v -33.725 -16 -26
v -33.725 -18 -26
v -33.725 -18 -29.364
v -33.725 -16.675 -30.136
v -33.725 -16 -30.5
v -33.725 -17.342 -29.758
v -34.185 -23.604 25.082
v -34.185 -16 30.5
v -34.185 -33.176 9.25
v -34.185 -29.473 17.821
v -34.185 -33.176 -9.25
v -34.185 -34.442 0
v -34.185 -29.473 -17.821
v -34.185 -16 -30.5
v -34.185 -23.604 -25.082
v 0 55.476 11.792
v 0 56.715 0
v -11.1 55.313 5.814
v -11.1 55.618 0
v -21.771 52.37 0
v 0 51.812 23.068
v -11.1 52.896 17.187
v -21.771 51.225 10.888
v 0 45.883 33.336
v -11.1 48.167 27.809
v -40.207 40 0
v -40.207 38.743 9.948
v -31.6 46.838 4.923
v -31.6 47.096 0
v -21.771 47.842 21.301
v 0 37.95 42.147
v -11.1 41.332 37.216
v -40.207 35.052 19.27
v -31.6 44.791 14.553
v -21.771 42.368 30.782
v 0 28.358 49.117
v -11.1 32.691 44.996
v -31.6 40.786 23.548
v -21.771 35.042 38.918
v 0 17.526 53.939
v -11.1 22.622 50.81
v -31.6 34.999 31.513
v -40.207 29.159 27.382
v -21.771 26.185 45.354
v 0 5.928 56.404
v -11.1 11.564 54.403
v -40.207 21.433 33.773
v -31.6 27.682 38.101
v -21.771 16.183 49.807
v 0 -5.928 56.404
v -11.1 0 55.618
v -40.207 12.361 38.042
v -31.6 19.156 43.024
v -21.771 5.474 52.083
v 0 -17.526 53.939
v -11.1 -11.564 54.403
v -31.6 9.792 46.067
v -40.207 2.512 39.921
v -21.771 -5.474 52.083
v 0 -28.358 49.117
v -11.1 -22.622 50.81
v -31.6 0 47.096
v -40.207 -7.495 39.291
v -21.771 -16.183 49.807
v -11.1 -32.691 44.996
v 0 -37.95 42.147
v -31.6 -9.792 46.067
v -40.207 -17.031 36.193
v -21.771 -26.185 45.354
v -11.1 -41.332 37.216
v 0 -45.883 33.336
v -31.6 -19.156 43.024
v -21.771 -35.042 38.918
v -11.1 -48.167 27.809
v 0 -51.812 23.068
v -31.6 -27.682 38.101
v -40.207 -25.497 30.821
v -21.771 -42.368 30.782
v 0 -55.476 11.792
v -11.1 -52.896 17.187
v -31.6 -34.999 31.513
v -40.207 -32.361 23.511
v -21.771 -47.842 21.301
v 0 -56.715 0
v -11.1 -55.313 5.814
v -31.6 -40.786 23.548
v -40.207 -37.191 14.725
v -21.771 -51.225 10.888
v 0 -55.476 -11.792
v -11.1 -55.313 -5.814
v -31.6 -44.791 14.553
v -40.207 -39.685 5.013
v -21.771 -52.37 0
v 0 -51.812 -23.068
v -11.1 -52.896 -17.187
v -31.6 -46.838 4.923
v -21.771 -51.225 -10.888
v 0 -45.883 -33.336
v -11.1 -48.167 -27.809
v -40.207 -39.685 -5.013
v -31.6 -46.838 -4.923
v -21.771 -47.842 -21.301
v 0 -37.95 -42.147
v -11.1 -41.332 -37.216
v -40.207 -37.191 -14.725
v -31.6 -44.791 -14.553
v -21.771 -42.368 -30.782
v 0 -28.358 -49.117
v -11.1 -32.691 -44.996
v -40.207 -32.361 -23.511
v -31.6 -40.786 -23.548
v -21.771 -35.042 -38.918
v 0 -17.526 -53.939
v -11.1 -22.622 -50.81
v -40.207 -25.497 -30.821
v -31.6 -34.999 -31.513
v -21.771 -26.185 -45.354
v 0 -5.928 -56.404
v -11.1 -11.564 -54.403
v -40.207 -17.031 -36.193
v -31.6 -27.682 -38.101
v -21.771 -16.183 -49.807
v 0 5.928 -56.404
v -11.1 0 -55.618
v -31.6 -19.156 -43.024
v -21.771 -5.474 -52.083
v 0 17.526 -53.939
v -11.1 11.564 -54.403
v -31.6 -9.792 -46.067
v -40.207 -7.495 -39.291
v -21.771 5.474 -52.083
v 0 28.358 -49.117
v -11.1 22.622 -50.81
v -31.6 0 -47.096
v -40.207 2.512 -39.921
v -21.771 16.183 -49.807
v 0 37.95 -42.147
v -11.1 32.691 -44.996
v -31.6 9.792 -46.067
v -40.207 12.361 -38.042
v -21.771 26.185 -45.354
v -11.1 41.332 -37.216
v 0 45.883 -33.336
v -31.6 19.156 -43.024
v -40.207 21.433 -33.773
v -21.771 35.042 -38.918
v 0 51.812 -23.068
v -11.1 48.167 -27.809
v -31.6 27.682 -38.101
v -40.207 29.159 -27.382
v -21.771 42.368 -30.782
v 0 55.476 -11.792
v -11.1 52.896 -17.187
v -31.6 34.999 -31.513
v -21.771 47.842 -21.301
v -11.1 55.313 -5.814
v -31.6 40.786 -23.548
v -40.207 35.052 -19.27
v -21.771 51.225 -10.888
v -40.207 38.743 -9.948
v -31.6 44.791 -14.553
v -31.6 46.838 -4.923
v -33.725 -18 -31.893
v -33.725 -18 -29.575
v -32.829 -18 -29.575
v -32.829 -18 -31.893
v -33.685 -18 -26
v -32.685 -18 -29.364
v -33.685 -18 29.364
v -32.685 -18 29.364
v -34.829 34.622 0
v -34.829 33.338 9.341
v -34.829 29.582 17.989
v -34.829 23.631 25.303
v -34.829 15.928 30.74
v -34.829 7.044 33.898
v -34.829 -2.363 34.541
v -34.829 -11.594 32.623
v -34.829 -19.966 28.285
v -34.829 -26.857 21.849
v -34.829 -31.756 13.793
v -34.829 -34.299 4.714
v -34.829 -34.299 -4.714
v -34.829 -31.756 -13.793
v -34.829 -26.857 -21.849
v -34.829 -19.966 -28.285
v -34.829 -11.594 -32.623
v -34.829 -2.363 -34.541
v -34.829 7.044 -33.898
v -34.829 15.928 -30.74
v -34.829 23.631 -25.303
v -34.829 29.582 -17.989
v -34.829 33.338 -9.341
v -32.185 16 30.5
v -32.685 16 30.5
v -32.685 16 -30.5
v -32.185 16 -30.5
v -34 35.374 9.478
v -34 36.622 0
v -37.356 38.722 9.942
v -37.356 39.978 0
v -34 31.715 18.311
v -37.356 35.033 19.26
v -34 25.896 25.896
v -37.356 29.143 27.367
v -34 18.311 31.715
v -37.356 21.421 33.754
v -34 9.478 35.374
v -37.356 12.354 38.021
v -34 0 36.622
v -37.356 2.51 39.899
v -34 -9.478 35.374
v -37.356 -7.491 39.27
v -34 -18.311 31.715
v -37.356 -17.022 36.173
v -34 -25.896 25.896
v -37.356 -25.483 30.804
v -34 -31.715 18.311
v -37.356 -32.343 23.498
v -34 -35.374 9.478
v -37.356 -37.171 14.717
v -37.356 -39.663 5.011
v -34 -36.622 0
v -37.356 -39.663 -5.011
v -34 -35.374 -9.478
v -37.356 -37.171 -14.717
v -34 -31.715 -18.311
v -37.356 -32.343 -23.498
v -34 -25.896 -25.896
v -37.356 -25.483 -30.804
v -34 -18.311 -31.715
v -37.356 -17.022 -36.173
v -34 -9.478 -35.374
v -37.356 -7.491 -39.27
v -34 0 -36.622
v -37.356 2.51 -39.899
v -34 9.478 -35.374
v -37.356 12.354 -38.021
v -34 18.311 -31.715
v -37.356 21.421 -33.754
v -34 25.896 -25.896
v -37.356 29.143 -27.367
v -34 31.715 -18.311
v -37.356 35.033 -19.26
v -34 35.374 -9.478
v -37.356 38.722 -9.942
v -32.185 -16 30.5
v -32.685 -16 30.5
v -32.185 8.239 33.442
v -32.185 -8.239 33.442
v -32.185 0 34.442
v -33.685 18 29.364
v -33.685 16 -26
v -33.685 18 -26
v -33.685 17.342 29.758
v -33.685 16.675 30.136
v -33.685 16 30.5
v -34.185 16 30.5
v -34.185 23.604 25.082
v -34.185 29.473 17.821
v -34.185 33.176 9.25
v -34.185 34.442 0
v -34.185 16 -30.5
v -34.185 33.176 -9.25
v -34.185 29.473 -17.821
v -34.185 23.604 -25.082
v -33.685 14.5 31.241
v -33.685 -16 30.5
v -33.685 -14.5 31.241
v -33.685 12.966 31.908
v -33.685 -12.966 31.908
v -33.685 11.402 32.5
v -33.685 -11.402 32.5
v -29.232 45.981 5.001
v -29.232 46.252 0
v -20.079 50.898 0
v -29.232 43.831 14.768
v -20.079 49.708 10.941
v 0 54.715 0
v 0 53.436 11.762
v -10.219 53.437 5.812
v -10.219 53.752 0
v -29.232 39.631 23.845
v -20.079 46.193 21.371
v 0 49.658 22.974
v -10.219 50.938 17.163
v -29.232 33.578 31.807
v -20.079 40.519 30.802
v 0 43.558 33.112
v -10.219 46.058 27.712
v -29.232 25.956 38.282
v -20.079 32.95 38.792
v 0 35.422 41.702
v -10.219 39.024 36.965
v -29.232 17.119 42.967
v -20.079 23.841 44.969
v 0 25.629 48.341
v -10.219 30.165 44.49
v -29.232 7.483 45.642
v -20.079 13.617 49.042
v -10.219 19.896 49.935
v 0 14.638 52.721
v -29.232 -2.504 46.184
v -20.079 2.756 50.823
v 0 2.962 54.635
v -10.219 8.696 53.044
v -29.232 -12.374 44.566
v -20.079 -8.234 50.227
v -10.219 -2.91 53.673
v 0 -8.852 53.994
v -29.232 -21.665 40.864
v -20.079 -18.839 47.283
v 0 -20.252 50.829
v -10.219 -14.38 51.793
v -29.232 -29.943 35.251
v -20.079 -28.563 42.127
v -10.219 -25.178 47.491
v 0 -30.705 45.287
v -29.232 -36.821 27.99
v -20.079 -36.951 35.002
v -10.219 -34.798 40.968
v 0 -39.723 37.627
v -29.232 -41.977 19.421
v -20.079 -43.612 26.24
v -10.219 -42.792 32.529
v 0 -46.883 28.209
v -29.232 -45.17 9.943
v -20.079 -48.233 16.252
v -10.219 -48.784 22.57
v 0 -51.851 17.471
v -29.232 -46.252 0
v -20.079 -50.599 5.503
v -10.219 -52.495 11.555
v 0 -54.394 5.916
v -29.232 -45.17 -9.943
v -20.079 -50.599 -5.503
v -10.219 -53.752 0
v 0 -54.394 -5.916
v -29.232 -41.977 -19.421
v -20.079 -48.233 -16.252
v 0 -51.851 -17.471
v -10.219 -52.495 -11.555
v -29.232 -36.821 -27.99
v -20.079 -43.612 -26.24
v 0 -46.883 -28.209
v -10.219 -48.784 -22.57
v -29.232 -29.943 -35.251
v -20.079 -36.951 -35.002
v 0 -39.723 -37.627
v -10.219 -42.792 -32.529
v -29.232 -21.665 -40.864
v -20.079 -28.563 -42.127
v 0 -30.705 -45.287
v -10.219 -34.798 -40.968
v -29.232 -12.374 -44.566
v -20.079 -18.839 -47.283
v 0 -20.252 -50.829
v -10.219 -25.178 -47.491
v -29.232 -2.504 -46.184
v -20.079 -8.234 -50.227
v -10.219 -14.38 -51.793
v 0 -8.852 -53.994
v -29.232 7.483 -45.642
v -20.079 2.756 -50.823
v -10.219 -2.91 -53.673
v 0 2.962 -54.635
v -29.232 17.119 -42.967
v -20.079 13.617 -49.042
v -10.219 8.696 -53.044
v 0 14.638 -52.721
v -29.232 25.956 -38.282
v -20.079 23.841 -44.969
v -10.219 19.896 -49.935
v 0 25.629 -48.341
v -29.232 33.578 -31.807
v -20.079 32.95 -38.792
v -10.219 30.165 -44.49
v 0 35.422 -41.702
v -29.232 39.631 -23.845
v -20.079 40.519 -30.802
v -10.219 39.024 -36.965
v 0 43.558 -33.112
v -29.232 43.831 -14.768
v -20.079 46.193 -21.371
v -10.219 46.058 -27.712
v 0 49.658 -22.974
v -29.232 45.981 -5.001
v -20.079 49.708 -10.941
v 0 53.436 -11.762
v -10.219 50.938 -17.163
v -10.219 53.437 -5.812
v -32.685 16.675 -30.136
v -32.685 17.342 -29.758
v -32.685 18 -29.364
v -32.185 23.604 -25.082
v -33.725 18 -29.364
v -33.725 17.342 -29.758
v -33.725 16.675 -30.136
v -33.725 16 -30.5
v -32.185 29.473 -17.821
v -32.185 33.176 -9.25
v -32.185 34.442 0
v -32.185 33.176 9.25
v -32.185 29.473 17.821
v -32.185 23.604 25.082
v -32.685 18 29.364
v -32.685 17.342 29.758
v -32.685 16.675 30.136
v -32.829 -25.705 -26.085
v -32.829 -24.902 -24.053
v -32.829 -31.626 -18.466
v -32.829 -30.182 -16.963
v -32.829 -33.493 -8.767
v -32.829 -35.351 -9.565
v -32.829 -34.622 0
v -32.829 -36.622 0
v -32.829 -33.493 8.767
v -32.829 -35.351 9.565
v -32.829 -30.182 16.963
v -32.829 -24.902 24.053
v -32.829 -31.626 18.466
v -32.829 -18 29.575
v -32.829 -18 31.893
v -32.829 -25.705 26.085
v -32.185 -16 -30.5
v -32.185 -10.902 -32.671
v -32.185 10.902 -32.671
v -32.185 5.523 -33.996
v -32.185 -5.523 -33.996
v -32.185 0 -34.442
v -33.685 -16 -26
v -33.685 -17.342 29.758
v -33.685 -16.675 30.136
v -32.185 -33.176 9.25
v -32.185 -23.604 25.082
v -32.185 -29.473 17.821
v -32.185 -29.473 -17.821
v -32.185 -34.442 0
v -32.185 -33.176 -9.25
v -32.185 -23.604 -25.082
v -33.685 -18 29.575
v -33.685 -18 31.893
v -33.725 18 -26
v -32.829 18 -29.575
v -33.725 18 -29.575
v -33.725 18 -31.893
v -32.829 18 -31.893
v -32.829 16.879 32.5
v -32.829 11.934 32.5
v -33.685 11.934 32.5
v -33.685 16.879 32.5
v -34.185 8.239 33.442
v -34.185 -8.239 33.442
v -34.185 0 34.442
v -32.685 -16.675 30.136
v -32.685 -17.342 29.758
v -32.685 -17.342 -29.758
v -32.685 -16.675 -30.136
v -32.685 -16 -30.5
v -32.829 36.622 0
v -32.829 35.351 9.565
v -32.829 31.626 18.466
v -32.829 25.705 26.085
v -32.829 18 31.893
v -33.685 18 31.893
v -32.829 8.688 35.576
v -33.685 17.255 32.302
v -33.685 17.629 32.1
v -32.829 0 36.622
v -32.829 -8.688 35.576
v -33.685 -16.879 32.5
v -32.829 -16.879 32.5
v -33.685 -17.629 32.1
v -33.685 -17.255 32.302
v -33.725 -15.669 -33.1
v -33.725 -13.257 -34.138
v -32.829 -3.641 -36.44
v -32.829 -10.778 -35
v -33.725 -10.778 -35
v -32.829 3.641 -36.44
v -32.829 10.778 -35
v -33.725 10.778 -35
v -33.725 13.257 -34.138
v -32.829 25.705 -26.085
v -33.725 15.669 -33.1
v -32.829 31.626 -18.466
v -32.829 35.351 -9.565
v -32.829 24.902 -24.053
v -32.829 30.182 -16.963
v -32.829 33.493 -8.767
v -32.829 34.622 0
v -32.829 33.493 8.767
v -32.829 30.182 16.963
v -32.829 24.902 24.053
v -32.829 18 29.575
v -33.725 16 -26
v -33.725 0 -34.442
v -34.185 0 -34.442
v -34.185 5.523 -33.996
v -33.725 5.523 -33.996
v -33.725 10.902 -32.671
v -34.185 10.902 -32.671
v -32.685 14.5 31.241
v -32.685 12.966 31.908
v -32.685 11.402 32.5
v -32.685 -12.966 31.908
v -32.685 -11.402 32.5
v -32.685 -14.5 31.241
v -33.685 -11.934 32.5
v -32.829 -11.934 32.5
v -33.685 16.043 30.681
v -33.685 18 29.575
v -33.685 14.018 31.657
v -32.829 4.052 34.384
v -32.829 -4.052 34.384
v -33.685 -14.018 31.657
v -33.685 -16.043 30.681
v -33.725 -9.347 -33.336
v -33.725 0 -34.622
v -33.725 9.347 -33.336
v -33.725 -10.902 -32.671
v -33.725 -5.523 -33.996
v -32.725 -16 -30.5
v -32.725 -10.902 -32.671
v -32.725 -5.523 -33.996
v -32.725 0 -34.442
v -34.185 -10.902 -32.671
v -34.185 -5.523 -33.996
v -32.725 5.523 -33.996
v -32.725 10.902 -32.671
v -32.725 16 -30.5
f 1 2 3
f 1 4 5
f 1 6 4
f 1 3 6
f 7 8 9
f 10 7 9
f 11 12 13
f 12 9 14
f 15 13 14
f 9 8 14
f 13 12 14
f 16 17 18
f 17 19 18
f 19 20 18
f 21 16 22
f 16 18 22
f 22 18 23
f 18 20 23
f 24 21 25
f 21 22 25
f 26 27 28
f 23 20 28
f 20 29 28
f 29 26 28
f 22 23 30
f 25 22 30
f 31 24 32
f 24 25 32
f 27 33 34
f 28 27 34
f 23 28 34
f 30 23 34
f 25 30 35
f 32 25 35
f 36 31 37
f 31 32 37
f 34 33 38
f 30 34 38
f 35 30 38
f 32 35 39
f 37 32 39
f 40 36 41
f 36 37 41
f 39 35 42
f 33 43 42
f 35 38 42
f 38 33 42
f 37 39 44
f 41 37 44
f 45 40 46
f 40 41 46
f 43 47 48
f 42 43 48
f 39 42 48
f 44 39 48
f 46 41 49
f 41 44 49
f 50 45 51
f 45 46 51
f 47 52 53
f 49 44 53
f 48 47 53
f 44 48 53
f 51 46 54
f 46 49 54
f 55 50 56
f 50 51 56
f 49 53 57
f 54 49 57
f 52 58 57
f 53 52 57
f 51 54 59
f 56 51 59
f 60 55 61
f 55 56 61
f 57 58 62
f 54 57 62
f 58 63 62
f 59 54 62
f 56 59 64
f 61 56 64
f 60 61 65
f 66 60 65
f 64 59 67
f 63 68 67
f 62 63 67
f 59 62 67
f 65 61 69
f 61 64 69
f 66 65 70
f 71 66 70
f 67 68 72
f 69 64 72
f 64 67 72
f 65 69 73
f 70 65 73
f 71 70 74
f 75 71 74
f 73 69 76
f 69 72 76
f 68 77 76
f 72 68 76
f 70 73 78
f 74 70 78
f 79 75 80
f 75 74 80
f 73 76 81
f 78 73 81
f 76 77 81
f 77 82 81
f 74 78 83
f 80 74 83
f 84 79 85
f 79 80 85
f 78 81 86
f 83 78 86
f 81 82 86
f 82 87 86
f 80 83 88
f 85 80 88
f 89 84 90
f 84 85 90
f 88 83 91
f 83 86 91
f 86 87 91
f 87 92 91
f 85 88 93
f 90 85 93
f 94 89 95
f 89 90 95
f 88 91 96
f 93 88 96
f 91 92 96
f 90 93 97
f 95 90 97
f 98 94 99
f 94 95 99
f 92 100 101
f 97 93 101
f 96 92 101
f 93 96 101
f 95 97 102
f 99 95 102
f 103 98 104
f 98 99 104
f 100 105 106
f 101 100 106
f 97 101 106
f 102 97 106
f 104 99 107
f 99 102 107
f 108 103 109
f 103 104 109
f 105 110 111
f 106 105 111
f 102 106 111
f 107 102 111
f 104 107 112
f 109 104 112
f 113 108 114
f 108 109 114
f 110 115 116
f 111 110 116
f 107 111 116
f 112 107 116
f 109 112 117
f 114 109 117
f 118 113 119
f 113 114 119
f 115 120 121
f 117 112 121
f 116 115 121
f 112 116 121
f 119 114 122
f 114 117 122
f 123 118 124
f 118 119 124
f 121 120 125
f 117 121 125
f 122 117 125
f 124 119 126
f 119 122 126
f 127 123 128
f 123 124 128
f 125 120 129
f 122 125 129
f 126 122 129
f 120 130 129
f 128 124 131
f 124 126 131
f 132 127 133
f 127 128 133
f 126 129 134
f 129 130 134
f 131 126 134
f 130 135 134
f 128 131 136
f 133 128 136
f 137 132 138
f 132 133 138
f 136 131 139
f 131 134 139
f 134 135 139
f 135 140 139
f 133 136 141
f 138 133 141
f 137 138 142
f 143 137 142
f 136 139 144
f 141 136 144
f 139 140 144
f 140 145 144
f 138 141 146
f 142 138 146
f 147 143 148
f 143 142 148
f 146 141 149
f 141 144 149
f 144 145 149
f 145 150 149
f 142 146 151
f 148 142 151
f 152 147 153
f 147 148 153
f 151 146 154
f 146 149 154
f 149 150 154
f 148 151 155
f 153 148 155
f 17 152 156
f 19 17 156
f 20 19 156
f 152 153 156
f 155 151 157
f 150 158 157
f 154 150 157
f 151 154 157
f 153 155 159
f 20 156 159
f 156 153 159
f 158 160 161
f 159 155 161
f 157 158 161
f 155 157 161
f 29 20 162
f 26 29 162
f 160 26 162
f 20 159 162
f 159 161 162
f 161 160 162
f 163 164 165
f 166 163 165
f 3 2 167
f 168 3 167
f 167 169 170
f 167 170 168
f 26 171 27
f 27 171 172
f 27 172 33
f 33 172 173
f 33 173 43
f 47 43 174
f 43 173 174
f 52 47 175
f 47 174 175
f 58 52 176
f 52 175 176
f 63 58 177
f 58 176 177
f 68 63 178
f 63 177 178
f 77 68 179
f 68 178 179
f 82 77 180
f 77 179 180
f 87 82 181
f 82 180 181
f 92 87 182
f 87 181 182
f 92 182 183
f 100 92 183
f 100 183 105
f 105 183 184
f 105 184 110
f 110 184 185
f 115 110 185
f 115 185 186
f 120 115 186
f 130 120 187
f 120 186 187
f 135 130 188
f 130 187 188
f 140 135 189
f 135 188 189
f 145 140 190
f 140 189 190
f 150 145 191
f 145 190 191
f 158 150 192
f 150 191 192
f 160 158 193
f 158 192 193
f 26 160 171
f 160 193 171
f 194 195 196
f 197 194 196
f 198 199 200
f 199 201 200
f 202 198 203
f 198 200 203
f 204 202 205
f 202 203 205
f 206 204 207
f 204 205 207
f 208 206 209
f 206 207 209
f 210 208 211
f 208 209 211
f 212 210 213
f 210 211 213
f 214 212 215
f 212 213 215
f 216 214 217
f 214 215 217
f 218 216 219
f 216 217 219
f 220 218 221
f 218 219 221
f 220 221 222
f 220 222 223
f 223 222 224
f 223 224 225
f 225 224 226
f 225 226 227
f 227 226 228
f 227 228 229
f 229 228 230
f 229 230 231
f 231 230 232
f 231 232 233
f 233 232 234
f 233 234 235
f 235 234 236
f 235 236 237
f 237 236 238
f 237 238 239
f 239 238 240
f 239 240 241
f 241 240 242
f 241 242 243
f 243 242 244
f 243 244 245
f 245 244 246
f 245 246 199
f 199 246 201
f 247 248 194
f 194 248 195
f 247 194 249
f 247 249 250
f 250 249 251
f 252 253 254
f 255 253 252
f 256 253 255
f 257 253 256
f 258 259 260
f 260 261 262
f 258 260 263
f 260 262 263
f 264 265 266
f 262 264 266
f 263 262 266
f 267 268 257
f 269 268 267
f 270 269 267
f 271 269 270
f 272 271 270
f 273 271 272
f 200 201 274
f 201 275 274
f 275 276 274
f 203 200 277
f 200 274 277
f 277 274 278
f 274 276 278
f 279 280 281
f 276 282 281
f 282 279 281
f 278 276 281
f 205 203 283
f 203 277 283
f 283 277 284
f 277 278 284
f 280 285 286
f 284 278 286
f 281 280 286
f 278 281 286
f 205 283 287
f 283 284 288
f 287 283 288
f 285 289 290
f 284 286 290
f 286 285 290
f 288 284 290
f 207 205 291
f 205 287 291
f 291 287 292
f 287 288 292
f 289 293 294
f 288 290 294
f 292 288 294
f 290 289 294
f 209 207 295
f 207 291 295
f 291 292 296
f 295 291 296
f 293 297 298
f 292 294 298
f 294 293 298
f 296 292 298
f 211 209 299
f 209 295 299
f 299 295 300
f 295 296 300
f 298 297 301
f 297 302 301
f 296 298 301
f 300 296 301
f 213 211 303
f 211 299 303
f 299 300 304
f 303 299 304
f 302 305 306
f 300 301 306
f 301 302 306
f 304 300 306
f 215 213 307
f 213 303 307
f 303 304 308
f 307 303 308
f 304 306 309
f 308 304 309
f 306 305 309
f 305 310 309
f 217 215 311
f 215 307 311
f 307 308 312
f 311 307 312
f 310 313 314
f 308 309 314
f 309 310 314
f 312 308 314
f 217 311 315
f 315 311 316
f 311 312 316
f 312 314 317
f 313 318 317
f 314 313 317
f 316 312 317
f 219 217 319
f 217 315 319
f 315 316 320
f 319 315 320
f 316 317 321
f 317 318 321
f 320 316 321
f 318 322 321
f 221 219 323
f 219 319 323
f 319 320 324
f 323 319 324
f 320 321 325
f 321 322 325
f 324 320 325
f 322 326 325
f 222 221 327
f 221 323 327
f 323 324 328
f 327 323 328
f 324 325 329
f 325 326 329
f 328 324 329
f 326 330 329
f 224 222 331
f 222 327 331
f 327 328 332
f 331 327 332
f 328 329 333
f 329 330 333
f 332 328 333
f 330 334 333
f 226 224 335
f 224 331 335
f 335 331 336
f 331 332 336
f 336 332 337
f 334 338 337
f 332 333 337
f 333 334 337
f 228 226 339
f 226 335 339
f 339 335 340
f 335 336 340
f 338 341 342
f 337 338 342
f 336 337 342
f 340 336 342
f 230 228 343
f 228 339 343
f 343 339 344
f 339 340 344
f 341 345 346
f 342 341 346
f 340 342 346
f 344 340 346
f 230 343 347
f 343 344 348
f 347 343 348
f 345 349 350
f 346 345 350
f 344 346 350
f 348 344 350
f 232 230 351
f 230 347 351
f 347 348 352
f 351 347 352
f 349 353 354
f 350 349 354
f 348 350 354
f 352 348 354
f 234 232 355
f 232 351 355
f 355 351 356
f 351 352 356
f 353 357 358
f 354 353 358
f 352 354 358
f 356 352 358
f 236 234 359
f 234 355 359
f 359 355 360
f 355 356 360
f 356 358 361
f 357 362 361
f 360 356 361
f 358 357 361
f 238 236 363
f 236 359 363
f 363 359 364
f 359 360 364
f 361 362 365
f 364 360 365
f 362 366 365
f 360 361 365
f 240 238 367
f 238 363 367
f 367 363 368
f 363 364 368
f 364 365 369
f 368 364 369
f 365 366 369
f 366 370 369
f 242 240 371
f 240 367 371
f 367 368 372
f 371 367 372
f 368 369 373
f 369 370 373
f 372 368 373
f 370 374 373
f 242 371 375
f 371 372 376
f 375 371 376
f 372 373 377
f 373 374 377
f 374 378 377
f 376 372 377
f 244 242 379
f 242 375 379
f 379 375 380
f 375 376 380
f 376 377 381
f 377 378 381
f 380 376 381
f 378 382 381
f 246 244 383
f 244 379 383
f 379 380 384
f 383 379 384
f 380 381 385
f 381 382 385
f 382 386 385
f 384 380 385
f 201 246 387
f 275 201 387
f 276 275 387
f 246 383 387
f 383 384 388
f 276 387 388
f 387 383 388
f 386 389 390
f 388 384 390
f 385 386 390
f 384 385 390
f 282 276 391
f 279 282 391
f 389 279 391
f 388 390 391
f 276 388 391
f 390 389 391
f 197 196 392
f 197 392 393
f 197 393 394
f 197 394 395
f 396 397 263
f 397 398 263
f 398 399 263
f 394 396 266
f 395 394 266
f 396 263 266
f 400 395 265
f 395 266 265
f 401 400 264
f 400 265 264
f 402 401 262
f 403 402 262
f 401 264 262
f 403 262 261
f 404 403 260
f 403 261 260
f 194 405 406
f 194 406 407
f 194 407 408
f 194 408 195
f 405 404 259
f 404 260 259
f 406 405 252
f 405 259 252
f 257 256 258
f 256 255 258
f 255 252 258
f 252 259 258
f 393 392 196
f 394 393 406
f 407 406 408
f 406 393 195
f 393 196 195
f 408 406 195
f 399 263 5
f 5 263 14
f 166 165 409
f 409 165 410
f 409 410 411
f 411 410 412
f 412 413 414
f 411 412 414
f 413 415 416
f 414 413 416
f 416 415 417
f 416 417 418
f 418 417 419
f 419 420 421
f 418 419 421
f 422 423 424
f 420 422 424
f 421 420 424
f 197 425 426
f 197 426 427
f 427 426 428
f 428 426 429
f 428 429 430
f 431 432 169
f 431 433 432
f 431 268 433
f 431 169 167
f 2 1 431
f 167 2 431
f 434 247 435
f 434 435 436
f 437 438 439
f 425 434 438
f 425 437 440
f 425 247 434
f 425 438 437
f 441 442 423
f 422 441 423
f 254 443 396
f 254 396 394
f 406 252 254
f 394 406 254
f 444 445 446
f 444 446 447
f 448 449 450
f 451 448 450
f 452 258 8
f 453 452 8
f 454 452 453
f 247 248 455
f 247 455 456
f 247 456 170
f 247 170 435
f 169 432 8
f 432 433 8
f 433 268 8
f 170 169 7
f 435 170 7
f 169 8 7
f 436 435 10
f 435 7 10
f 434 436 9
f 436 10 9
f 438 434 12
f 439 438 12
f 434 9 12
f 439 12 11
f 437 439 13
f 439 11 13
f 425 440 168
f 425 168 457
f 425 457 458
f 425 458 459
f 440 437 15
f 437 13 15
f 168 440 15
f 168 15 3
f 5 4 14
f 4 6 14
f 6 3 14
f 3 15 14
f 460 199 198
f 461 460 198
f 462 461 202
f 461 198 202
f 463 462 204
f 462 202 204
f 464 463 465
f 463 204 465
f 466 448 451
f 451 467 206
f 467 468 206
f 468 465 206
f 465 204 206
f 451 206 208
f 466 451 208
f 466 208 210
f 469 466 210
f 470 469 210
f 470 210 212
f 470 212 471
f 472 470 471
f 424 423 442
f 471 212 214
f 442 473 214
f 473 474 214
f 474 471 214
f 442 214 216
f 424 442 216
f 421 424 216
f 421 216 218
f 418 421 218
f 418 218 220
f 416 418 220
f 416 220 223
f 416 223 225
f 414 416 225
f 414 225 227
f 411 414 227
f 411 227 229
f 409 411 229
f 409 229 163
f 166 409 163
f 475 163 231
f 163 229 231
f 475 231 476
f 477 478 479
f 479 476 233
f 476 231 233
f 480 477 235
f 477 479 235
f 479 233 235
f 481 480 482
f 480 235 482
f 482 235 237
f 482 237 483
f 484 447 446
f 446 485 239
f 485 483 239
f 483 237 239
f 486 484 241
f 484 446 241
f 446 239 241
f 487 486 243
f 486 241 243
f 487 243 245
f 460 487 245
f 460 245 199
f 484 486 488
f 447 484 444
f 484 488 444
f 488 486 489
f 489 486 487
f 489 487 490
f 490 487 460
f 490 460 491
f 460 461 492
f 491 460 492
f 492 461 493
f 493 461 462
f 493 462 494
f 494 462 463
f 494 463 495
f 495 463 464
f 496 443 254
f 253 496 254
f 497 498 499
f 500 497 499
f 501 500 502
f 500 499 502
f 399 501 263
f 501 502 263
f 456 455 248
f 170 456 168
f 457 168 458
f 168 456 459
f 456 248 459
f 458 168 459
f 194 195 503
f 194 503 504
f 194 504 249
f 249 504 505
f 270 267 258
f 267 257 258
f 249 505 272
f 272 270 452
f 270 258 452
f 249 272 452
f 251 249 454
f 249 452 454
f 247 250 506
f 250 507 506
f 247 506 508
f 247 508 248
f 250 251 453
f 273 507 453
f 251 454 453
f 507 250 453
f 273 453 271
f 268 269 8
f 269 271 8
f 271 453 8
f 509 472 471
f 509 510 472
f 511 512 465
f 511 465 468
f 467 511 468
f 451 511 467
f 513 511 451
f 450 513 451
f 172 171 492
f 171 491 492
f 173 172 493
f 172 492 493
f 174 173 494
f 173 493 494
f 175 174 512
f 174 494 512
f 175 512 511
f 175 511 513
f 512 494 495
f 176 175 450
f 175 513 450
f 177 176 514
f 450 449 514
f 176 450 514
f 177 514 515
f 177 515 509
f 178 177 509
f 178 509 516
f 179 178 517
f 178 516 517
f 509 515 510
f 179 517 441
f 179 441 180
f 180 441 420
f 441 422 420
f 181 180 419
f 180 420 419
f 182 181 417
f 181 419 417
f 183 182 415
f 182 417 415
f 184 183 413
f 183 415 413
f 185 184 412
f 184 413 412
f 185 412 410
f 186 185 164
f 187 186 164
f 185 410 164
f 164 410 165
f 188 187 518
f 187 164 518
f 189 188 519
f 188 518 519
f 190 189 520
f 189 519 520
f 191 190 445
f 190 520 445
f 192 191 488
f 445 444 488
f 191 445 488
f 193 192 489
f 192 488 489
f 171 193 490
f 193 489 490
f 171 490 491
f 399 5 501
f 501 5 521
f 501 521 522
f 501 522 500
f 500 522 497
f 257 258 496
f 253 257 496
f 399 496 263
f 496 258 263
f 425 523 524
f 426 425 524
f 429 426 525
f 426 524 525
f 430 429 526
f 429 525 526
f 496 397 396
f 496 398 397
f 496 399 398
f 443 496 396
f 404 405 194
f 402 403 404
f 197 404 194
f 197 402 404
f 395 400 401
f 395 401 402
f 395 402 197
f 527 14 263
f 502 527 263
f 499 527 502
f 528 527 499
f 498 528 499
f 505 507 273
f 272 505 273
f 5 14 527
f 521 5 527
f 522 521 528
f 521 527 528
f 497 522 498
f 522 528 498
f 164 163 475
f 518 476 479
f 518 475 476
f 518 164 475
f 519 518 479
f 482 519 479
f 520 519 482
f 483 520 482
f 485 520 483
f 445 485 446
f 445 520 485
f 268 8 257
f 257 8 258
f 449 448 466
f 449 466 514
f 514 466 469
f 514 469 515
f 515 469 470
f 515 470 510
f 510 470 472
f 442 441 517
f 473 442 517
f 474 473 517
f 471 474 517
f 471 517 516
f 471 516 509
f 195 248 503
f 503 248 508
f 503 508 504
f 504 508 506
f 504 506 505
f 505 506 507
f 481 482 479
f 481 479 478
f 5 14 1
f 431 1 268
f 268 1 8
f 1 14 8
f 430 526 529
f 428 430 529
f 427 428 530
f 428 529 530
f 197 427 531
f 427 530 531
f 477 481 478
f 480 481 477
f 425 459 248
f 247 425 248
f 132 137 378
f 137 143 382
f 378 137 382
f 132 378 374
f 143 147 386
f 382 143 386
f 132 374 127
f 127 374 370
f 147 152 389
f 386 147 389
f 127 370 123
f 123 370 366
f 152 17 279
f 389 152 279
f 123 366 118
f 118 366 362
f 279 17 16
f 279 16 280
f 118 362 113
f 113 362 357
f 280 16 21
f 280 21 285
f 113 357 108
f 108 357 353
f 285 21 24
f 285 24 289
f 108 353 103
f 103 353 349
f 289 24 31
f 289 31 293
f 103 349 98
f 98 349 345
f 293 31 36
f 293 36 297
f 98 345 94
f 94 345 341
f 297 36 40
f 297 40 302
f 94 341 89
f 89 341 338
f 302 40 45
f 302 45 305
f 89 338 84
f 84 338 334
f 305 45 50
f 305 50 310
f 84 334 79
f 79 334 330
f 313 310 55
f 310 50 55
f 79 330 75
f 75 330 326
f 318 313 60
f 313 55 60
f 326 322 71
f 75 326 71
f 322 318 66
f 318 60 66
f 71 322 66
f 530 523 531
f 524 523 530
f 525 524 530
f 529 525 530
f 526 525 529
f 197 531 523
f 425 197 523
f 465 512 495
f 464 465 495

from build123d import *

# Parameters (mm, degrees)
BOSS_EXTRUDE1_DEPTH   = 2
BOSS_EXTRUDE1_2_DEPTH = 2
BOSS_EXTRUDE1_3_DEPTH = 2
BOSS_EXTRUDE1_4_DEPTH = 2
SKETCH9_W             = 1
SKETCH9_H             = 61
CUT_EXTRUDE1_DEPTH    = 2
SKETCH10_W            = 1
SKETCH10_H            = 61
CUT_EXTRUDE2_DEPTH    = 2
SKETCH12_W            = 1
SKETCH12_H            = 36
CUT_EXTRUDE3_DEPTH    = 2
SKETCH13_W            = 1
SKETCH13_H            = 36
CUT_EXTRUDE8_DEPTH    = 4.5


with BuildPart() as part:
    # Sketch1 → Revolve1 (revolve)
    with BuildSketch(Plane.XY):
        with BuildLine():
            Line((-40.206859547, 40), (-34.828674339, 34.621814792))
            Line((-34.828674339, 34.621814792), (-32.828674339, 34.621814792))
            Line((-32.828674339, 34.621814792), (-32.828674339, 36.621814792))
            Line((-32.828674339, 36.621814792), (-34.000247215, 36.621814792))
            Line((-34.000247215, 36.621814792), (-37.356354939, 39.977922516))
            ThreePointArc((-37.356354939, 39.977922516), (-20.079086089, 50.897562268), (0, 54.715002906))
            Line((0, 54.715002906), (0, 56.715002906))
            ThreePointArc((0, 56.715002906), (-21.771442745, 52.369798887), (-40.206859547, 40))
        make_face()
    revolve(axis=Axis((-112.648728237, 0, 0), (1, 0, 0)))


with BuildPart() as body_2:
    # Sketch7 → Boss-Extrude1 (new body)
    with BuildSketch(Plane(origin=(-34.185, 0, 0), x_dir=(0, 0, -1), z_dir=(1, 0, 0))):
        with BuildLine():
            ThreePointArc((30.5, 16), (0, 34.441980199), (-30.5, 16))
            Line((-30.5, 16), (30.5, 16))
        make_face()
    extrude(amount=BOSS_EXTRUDE1_DEPTH)


with BuildPart() as body_3:
    # Sketch7 → Boss-Extrude1 2 (new body)
    with BuildSketch(Plane(origin=(-34.185, 0, 0), x_dir=(0, 0, -1), z_dir=(1, 0, 0))):
        with BuildLine():
            Line((-30.5, -16), (-30.5, 16))
            ThreePointArc((-30.5, 16), (-34.441980199, 0), (-30.5, -16))
        make_face()
    extrude(amount=BOSS_EXTRUDE1_2_DEPTH)


with BuildPart() as body_4:
    # Sketch7 → Boss-Extrude1 3 (new body)
    with BuildSketch(Plane(origin=(-34.185, 0, 0), x_dir=(0, 0, -1), z_dir=(1, 0, 0))):
        with BuildLine():
            Line((30.5, -16), (-30.5, -16))
            ThreePointArc((-30.5, -16), (0, -34.441980199), (30.5, -16))
        make_face()
    extrude(amount=BOSS_EXTRUDE1_3_DEPTH)


with BuildPart() as body_5:
    # Sketch7 → Boss-Extrude1 4 (new body)
    with BuildSketch(Plane(origin=(-34.185, 0, 0), x_dir=(0, 0, -1), z_dir=(1, 0, 0))):
        with BuildLine():
            ThreePointArc((34.441980199, 0), (33.441967616, 8.239223384), (30.5, 16))
            Line((30.5, 16), (30.5, -16))
            ThreePointArc((30.5, -16), (33.441967616, -8.239223384), (34.441980199, 0))
        make_face()
    extrude(amount=BOSS_EXTRUDE1_4_DEPTH)


with BuildPart() as cut_extrude1_tool:
    # Sketch9 → Cut-Extrude1 (new body)
    with BuildSketch(Plane.XZ.offset(-16)):
        with Locations((-33.185, 0)):
            Rectangle(SKETCH9_W, SKETCH9_H)
    extrude(amount=-CUT_EXTRUDE1_DEPTH)


with BuildPart() as part_1:
    add(part.part)

    # Cut-Extrude1: cut by cut_extrude1_tool
    add(cut_extrude1_tool.part, mode=Mode.SUBTRACT)


with BuildPart() as body_2_1:
    add(body_2.part)

    # Cut-Extrude1: cut by cut_extrude1_tool
    add(cut_extrude1_tool.part, mode=Mode.SUBTRACT)


with BuildPart() as cut_extrude2_tool:
    # Sketch10 → Cut-Extrude2 (new body)
    with BuildSketch(Plane(origin=(0, -16, 0), x_dir=(1, 0, 0), z_dir=(0, 1, 0))):
        with Locations((-33.185, 0)):
            Rectangle(SKETCH10_W, SKETCH10_H)
    extrude(amount=-CUT_EXTRUDE2_DEPTH)


with BuildPart() as part_2:
    add(part_1.part)

    # Cut-Extrude2: cut by cut_extrude2_tool
    add(cut_extrude2_tool.part, mode=Mode.SUBTRACT)


with BuildPart() as body_4_1:
    add(body_4.part)

    # Cut-Extrude2: cut by cut_extrude2_tool
    add(cut_extrude2_tool.part, mode=Mode.SUBTRACT)


with BuildPart() as cut_extrude3_tool:
    # Sketch12 → Cut-Extrude3 (new body)
    with BuildSketch(Plane(origin=(0, 0, 30.5), x_dir=(-1, 0, 0), z_dir=(0, 0, -1))):
        with Locations((33.185, 0)):
            Rectangle(SKETCH12_W, SKETCH12_H)
    extrude(amount=-CUT_EXTRUDE3_DEPTH)


with BuildPart() as part_3:
    add(part_2.part)

    # Cut-Extrude3: cut by cut_extrude3_tool
    add(cut_extrude3_tool.part, mode=Mode.SUBTRACT)


with BuildPart() as body_3_1:
    add(body_3.part)

    # Cut-Extrude3: cut by cut_extrude3_tool
    add(cut_extrude3_tool.part, mode=Mode.SUBTRACT)


with BuildPart() as cut_extrude8_tool:
    # Sketch13 → Cut-Extrude8 (new body, symmetric)
    with BuildSketch(Plane.XY.offset(-30.5)):
        with Locations((-33.225443476, 0)):
            Rectangle(SKETCH13_W, SKETCH13_H)
    extrude(amount=CUT_EXTRUDE8_DEPTH, both=True)


with BuildPart() as part_4:
    add(part_3.part)

    # Cut-Extrude8: cut by cut_extrude8_tool
    add(cut_extrude8_tool.part, mode=Mode.SUBTRACT)


with BuildPart() as body_2_2:
    add(body_2_1.part)

    # Cut-Extrude8: cut by cut_extrude8_tool
    add(cut_extrude8_tool.part, mode=Mode.SUBTRACT)


with BuildPart() as body_4_2:
    add(body_4_1.part)

    # Cut-Extrude8: cut by cut_extrude8_tool
    add(cut_extrude8_tool.part, mode=Mode.SUBTRACT)


with BuildPart() as body_5_1:
    add(body_5.part)

    # Cut-Extrude8: cut by cut_extrude8_tool
    add(cut_extrude8_tool.part, mode=Mode.SUBTRACT)


solid = Compound([body_3_1.part, part_4.part, body_2_2.part, body_4_2.part, body_5_1.part])
